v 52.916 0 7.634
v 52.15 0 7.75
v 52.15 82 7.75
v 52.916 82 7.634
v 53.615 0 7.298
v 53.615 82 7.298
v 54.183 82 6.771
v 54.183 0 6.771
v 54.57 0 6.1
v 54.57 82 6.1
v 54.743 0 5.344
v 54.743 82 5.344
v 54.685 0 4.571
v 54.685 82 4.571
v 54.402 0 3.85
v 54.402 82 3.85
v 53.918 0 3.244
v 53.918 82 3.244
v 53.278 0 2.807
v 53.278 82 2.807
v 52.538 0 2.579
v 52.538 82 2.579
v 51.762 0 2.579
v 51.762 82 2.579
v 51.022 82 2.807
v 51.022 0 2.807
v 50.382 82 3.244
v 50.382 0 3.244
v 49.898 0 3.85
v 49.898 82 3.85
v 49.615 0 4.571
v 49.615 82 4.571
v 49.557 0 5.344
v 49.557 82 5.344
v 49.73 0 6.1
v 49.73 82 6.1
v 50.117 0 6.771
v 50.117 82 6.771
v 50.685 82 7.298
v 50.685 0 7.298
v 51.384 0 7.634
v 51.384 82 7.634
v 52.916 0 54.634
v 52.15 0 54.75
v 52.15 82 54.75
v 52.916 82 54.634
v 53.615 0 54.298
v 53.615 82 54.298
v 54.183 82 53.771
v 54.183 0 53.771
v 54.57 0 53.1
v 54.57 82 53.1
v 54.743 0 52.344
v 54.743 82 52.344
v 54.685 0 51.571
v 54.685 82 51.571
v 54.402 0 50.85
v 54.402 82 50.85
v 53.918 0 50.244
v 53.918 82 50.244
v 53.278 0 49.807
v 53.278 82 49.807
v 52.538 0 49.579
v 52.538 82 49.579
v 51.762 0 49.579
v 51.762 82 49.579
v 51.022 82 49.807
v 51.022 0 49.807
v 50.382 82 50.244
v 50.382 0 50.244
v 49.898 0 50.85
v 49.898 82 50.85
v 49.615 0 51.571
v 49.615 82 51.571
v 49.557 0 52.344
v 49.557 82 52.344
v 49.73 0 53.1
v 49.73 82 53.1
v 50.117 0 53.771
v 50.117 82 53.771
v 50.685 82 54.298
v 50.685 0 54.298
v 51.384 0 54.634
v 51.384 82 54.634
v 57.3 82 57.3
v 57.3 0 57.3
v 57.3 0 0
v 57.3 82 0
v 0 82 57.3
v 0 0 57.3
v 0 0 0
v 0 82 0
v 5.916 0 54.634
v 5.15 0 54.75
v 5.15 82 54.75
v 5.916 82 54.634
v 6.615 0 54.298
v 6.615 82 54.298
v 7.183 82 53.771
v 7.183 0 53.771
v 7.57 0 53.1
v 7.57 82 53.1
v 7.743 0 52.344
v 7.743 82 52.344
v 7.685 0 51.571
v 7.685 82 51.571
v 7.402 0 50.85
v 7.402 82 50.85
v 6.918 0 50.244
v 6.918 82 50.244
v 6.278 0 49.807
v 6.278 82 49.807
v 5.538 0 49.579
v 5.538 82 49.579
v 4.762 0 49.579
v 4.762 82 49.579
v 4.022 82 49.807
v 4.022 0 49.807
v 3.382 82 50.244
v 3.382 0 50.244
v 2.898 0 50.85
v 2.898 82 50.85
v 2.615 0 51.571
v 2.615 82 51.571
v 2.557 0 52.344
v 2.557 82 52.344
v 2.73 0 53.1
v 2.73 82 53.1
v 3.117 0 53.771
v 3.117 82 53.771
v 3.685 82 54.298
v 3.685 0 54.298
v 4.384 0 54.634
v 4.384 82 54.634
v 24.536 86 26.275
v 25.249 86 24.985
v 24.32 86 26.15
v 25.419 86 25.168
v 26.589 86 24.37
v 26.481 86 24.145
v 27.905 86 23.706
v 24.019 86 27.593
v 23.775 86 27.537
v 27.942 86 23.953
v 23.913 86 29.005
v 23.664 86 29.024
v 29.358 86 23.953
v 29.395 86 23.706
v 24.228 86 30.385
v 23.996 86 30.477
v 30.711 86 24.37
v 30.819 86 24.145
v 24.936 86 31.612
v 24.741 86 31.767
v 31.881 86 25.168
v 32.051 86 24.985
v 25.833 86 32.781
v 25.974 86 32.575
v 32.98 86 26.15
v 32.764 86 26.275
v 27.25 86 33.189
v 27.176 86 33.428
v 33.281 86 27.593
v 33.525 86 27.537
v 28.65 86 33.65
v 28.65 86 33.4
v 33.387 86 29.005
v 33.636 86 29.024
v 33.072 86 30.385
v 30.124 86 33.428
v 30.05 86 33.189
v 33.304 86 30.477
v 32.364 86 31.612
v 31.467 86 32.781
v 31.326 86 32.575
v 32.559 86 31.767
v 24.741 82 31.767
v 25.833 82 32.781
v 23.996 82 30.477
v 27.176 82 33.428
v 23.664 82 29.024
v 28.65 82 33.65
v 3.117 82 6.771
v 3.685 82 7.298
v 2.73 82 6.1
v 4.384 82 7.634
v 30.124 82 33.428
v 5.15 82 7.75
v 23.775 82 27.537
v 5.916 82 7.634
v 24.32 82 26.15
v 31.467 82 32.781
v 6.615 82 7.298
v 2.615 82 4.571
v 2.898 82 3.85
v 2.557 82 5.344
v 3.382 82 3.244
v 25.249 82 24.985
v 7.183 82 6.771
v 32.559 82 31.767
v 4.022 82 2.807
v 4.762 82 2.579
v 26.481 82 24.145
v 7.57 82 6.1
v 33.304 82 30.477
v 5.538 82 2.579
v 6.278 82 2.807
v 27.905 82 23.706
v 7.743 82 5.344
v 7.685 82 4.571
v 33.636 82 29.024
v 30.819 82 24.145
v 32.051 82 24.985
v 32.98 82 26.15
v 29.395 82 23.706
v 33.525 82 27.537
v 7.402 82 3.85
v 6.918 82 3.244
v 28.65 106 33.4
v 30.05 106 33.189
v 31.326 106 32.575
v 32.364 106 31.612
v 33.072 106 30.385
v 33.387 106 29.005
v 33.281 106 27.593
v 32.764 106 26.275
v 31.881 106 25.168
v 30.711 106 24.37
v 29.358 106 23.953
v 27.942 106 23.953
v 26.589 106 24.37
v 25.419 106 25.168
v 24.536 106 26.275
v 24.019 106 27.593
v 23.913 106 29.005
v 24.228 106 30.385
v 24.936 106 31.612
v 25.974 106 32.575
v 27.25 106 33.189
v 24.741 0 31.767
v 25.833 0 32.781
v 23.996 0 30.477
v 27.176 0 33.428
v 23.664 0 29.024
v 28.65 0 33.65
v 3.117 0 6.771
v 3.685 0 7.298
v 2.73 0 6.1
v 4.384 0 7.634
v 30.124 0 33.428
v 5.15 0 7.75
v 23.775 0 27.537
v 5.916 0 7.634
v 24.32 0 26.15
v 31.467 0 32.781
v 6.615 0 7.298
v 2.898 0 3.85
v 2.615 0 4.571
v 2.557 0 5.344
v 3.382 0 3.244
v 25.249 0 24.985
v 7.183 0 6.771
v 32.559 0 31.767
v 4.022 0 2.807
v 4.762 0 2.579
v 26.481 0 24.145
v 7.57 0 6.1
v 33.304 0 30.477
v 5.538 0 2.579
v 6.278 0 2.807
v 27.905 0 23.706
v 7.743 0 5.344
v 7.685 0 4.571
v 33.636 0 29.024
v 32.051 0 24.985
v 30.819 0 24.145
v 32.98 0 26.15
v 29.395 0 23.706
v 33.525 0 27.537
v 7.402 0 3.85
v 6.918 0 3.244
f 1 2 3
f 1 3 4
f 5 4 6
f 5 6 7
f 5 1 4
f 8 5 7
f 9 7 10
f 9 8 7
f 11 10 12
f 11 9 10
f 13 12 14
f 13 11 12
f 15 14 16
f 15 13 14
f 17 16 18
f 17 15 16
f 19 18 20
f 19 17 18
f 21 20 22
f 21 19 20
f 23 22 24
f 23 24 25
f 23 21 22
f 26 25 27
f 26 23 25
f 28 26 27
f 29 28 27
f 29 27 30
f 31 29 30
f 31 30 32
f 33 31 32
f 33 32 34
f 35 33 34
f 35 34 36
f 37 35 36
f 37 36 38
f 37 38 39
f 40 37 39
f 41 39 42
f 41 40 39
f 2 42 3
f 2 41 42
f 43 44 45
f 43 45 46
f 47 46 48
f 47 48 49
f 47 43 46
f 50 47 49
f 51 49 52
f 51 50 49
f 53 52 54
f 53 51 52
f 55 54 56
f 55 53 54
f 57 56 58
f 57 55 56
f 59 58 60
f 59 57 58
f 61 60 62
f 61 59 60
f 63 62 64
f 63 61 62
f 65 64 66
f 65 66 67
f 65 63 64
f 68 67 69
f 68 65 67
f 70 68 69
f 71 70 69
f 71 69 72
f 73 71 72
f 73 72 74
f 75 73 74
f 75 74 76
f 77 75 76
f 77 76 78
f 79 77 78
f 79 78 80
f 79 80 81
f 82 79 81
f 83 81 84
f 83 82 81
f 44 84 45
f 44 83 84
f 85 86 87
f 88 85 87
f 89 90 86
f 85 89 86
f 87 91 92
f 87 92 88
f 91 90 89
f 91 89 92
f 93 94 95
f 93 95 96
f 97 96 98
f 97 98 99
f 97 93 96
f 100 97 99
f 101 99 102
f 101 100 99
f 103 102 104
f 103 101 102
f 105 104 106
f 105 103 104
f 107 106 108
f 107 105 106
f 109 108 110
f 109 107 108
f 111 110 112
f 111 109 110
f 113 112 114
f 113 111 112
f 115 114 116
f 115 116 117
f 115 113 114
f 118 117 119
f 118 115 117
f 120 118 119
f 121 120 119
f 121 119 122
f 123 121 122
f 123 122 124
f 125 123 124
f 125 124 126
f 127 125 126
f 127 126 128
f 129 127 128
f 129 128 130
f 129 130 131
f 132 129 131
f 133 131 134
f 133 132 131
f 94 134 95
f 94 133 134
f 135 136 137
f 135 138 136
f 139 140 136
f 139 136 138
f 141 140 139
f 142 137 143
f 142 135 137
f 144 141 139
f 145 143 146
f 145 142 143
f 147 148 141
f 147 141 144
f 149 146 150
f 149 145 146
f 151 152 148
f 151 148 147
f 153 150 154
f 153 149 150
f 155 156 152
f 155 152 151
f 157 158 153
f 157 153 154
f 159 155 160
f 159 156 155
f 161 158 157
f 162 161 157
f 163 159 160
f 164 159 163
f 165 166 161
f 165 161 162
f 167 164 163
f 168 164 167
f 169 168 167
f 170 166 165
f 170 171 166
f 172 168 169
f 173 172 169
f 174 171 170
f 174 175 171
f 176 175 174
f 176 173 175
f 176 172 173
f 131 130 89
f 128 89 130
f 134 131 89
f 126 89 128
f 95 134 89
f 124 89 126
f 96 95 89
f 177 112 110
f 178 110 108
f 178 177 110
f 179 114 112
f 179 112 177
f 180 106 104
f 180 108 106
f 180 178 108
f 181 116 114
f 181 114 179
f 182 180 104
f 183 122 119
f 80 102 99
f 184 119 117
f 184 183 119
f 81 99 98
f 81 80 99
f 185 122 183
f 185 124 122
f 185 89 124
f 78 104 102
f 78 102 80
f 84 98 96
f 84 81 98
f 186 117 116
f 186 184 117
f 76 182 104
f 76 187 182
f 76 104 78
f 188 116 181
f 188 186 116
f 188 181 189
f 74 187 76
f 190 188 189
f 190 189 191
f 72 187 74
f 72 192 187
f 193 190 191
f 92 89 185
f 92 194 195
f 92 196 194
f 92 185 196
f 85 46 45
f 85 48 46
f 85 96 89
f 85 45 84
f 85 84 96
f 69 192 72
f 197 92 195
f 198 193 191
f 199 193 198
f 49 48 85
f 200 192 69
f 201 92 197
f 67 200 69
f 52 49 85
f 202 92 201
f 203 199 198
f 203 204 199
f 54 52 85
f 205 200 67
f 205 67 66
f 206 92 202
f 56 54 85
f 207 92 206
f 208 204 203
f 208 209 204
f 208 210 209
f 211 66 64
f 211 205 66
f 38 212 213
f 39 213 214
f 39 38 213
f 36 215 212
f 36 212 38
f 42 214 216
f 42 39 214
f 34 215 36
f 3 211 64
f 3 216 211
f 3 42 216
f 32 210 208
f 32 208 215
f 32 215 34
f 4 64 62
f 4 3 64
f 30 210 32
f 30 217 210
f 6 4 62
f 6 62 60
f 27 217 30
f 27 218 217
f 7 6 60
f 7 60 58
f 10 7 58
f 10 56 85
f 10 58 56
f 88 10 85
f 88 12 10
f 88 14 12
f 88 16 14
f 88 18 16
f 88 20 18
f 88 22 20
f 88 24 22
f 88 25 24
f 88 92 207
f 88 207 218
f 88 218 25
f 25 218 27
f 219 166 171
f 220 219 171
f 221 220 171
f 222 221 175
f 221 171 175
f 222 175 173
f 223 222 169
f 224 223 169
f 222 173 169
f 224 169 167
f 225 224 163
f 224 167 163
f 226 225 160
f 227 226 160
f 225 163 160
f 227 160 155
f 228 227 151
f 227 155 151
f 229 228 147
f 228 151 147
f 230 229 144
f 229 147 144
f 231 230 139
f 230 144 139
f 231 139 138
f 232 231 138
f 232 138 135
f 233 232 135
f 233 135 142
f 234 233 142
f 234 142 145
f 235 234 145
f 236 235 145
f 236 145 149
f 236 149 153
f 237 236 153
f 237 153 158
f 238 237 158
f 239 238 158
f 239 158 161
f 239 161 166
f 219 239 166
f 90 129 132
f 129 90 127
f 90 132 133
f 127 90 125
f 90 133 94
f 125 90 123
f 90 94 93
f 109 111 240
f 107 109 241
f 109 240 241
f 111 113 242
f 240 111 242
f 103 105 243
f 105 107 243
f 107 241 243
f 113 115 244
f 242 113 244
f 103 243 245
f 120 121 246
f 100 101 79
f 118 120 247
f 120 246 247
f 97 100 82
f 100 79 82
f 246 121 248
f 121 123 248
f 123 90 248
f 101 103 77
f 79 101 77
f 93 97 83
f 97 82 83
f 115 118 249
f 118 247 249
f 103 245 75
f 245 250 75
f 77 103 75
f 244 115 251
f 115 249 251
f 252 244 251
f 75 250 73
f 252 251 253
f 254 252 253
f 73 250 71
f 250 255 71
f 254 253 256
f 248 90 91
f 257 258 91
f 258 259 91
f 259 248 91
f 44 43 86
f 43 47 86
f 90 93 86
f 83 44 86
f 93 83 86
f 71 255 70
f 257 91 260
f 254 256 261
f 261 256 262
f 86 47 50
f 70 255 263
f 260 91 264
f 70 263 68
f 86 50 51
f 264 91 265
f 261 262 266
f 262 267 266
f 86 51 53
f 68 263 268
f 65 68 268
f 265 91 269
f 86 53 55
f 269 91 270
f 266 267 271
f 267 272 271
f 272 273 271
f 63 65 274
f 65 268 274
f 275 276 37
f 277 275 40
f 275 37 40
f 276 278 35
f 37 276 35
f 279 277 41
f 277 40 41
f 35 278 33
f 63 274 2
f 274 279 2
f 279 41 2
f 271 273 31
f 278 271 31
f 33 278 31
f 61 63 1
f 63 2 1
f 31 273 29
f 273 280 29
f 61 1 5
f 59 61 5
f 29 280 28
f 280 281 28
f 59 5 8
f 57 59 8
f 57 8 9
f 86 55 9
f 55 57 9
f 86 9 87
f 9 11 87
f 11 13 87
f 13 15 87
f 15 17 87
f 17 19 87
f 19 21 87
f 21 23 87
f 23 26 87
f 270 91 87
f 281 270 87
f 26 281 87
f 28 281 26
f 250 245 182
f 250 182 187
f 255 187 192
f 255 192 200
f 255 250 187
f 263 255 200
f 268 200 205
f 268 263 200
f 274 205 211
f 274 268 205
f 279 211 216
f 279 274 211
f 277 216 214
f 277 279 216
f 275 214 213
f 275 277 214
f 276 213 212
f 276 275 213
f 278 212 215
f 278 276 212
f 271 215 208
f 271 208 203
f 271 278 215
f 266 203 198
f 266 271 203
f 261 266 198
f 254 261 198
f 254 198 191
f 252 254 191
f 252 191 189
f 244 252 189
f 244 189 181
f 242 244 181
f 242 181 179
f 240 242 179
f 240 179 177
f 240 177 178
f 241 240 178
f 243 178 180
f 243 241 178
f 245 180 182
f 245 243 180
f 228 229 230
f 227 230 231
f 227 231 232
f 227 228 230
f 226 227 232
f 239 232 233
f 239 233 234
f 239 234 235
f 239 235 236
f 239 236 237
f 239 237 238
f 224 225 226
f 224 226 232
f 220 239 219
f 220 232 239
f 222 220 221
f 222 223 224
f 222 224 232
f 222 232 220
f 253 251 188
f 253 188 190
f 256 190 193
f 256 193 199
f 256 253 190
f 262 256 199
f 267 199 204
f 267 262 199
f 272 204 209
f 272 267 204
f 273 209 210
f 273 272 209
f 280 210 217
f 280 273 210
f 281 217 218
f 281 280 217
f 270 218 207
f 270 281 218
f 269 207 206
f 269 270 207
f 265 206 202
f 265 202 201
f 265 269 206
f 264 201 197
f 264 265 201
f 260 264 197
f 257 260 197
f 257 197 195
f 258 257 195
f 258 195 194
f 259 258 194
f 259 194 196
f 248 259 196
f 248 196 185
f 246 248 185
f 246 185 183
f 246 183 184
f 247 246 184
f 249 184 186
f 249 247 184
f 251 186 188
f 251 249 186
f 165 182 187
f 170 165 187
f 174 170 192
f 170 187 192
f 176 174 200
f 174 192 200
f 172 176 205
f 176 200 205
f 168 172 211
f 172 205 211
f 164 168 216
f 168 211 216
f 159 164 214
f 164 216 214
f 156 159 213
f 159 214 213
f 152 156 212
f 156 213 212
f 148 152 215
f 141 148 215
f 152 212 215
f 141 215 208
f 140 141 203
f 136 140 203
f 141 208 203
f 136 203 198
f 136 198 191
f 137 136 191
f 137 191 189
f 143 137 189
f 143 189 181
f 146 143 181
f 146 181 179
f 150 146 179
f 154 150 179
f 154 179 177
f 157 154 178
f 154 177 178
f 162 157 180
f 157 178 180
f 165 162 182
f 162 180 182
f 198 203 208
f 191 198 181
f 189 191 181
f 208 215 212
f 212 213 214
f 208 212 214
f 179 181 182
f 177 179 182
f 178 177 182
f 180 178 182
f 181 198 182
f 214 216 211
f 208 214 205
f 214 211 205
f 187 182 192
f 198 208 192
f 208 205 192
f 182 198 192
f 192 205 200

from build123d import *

# Parameters (mm, degrees)
SKETCH1_W           = 57.3
SKETCH1_H           = 57.3
SKETCH1_R           = 5
SKETCH1_R_2         = 2.6
BOSS_EXTRUDE1_DEPTH = 82
BOSS_EXTRUDE2_START = 82
SKETCH1_4_R         = 5
SKETCH1_4_R_2       = 4.75
BOSS_EXTRUDE2_DEPTH = 4
BOSS_EXTRUDE3_START = 82
SKETCH1_5_R         = 4.75
BOSS_EXTRUDE3_DEPTH = 24


with BuildPart() as part:
    # Sketch1 → Boss-Extrude1 (new body)
    with BuildSketch(Plane(origin=(0, 0, 0), x_dir=(1, 0, 0), z_dir=(0, 1, 0))):
        with Locations((28.65, -28.65)):
            Rectangle(SKETCH1_W, SKETCH1_H)
        with Locations(Location((28.65, -28.65, 0), (0, 0, 270))):
            Circle(SKETCH1_R, mode=Mode.SUBTRACT)
        with Locations(Location((52.15, -52.15, 0), (0, 0, 270))):
            Circle(SKETCH1_R_2, mode=Mode.SUBTRACT)
        with Locations(Location((5.15, -52.15, 0), (0, 0, 270))):
            Circle(SKETCH1_R_2, mode=Mode.SUBTRACT)
        with Locations(Location((52.15, -5.15, 0), (0, 0, 270))):
            Circle(SKETCH1_R_2, mode=Mode.SUBTRACT)
        with Locations(Location((5.15, -5.15, 0), (0, 0, 270))):
            Circle(SKETCH1_R_2, mode=Mode.SUBTRACT)
    extrude(amount=BOSS_EXTRUDE1_DEPTH)


with BuildPart() as body_2:
    # Sketch1<4> → Boss-Extrude2 (new body)
    with BuildSketch(Plane(origin=(0, 0, 0), x_dir=(1, 0, 0), z_dir=(0, 1, 0)).offset(BOSS_EXTRUDE2_START)):
        with Locations(Location((28.65, -28.65, 0), (0, 0, 270))):
            Circle(SKETCH1_4_R)
        with Locations(Location((28.65, -28.65, 0), (0, 0, 270))):
            Circle(SKETCH1_4_R_2, mode=Mode.SUBTRACT)
    extrude(amount=BOSS_EXTRUDE2_DEPTH)

    # Sketch1<5> → Boss-Extrude3 (add)
    with BuildSketch(Plane(origin=(0, 0, 0), x_dir=(1, 0, 0), z_dir=(0, 1, 0)).offset(BOSS_EXTRUDE3_START)):
        with Locations(Location((28.65, -28.65, 0), (0, 0, 270))):
            Circle(SKETCH1_5_R)
    extrude(amount=BOSS_EXTRUDE3_DEPTH)


solid = Compound([part.part, body_2.part])
